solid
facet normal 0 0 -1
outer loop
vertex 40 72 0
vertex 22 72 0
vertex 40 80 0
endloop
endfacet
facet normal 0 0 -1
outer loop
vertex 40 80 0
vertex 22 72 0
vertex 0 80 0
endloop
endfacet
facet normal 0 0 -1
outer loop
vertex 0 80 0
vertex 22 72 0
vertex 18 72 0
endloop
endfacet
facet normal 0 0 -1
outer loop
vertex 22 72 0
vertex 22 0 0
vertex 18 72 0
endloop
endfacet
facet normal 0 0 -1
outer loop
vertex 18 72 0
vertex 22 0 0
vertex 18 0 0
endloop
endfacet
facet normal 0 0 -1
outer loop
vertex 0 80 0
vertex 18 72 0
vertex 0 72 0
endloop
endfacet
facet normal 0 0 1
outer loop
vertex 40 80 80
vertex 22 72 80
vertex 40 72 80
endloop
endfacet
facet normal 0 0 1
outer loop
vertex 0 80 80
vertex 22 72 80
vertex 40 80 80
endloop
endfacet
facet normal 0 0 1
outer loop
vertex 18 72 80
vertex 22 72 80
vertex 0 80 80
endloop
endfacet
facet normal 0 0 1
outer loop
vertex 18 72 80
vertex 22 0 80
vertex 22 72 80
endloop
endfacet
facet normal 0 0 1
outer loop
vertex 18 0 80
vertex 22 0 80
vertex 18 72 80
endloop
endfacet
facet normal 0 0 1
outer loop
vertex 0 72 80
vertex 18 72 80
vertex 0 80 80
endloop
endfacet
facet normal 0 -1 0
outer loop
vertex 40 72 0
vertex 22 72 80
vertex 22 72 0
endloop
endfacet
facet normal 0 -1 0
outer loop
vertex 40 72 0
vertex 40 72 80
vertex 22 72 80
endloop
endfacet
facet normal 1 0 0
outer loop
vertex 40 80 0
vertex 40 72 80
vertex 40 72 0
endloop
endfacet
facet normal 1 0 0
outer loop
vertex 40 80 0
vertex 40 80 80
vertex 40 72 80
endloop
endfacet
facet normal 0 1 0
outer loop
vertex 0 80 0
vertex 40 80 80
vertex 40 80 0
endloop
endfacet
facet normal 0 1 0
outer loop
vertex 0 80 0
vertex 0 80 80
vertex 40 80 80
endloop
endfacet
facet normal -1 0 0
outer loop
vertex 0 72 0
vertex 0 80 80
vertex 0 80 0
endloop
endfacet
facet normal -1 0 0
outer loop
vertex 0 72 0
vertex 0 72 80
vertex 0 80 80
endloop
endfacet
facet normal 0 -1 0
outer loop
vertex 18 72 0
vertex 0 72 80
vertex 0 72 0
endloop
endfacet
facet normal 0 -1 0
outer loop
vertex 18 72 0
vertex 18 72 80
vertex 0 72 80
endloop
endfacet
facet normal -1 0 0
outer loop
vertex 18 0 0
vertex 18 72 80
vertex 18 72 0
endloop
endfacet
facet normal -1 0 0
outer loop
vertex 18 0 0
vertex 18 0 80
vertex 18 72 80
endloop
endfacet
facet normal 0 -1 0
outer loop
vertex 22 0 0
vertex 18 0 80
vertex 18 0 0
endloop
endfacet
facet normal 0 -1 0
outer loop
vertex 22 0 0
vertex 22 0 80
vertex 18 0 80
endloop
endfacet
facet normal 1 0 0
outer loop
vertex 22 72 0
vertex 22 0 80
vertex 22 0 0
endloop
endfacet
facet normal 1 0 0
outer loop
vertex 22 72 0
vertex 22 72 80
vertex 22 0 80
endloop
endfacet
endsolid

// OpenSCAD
$fn = 32;

// ----------------------------------------------------------------------
// Structural section: tee 40 x 80 mm
// ----------------------------------------------------------------------

// --- parameters (mm) ---
sec_w = 40;               // tee width, X
sec_h = 80;               // tee height, Y
flange_t = 8;             // top flange thickness
web_t = 4;                // web thickness
plate_t = 80;             // cut length, Z (extrusion height)

profile = [[18, 0], [22, 0], [22, 72], [40, 72], [40, 80], [0, 80], [0, 72], [18, 72]];  // primary outline, 8 points, counter clockwise

// --- the one profile operation ---
linear_extrude(height = plate_t) polygon(points = profile);
